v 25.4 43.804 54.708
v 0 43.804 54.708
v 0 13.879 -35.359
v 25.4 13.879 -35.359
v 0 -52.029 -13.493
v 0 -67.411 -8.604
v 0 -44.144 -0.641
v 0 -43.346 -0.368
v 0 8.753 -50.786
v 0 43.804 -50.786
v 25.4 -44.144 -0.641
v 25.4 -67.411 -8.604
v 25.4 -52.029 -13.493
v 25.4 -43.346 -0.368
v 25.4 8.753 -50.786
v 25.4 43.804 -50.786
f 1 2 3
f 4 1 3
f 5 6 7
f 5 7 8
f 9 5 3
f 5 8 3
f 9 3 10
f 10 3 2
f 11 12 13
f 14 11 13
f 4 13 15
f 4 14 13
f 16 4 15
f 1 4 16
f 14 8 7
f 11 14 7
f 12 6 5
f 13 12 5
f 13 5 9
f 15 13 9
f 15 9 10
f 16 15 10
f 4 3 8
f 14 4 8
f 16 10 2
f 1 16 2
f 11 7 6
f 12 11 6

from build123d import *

# Parameters (mm, degrees)
F1_DEPTH = 25.4


with BuildPart() as f1:
    # F0 (on Right) → F1 (new body)
    with BuildSketch(Plane.YZ):
        Polygon((8.753066, -50.786357), (13.879089, -35.358516), (-43.346036, -0.368352), (-44.144051, -0.641464), (-52.029345, -13.493421), align=None)
        Polygon((-67.410849, -8.604288), (-52.029345, -13.493421), (-44.144051, -0.641464), align=None)
        Polygon((43.804381, -50.786357), (43.804381, 54.707926), (13.879089, -35.358516), (8.753066, -50.786357), align=None)
    extrude(amount=F1_DEPTH)


solid = f1.part
